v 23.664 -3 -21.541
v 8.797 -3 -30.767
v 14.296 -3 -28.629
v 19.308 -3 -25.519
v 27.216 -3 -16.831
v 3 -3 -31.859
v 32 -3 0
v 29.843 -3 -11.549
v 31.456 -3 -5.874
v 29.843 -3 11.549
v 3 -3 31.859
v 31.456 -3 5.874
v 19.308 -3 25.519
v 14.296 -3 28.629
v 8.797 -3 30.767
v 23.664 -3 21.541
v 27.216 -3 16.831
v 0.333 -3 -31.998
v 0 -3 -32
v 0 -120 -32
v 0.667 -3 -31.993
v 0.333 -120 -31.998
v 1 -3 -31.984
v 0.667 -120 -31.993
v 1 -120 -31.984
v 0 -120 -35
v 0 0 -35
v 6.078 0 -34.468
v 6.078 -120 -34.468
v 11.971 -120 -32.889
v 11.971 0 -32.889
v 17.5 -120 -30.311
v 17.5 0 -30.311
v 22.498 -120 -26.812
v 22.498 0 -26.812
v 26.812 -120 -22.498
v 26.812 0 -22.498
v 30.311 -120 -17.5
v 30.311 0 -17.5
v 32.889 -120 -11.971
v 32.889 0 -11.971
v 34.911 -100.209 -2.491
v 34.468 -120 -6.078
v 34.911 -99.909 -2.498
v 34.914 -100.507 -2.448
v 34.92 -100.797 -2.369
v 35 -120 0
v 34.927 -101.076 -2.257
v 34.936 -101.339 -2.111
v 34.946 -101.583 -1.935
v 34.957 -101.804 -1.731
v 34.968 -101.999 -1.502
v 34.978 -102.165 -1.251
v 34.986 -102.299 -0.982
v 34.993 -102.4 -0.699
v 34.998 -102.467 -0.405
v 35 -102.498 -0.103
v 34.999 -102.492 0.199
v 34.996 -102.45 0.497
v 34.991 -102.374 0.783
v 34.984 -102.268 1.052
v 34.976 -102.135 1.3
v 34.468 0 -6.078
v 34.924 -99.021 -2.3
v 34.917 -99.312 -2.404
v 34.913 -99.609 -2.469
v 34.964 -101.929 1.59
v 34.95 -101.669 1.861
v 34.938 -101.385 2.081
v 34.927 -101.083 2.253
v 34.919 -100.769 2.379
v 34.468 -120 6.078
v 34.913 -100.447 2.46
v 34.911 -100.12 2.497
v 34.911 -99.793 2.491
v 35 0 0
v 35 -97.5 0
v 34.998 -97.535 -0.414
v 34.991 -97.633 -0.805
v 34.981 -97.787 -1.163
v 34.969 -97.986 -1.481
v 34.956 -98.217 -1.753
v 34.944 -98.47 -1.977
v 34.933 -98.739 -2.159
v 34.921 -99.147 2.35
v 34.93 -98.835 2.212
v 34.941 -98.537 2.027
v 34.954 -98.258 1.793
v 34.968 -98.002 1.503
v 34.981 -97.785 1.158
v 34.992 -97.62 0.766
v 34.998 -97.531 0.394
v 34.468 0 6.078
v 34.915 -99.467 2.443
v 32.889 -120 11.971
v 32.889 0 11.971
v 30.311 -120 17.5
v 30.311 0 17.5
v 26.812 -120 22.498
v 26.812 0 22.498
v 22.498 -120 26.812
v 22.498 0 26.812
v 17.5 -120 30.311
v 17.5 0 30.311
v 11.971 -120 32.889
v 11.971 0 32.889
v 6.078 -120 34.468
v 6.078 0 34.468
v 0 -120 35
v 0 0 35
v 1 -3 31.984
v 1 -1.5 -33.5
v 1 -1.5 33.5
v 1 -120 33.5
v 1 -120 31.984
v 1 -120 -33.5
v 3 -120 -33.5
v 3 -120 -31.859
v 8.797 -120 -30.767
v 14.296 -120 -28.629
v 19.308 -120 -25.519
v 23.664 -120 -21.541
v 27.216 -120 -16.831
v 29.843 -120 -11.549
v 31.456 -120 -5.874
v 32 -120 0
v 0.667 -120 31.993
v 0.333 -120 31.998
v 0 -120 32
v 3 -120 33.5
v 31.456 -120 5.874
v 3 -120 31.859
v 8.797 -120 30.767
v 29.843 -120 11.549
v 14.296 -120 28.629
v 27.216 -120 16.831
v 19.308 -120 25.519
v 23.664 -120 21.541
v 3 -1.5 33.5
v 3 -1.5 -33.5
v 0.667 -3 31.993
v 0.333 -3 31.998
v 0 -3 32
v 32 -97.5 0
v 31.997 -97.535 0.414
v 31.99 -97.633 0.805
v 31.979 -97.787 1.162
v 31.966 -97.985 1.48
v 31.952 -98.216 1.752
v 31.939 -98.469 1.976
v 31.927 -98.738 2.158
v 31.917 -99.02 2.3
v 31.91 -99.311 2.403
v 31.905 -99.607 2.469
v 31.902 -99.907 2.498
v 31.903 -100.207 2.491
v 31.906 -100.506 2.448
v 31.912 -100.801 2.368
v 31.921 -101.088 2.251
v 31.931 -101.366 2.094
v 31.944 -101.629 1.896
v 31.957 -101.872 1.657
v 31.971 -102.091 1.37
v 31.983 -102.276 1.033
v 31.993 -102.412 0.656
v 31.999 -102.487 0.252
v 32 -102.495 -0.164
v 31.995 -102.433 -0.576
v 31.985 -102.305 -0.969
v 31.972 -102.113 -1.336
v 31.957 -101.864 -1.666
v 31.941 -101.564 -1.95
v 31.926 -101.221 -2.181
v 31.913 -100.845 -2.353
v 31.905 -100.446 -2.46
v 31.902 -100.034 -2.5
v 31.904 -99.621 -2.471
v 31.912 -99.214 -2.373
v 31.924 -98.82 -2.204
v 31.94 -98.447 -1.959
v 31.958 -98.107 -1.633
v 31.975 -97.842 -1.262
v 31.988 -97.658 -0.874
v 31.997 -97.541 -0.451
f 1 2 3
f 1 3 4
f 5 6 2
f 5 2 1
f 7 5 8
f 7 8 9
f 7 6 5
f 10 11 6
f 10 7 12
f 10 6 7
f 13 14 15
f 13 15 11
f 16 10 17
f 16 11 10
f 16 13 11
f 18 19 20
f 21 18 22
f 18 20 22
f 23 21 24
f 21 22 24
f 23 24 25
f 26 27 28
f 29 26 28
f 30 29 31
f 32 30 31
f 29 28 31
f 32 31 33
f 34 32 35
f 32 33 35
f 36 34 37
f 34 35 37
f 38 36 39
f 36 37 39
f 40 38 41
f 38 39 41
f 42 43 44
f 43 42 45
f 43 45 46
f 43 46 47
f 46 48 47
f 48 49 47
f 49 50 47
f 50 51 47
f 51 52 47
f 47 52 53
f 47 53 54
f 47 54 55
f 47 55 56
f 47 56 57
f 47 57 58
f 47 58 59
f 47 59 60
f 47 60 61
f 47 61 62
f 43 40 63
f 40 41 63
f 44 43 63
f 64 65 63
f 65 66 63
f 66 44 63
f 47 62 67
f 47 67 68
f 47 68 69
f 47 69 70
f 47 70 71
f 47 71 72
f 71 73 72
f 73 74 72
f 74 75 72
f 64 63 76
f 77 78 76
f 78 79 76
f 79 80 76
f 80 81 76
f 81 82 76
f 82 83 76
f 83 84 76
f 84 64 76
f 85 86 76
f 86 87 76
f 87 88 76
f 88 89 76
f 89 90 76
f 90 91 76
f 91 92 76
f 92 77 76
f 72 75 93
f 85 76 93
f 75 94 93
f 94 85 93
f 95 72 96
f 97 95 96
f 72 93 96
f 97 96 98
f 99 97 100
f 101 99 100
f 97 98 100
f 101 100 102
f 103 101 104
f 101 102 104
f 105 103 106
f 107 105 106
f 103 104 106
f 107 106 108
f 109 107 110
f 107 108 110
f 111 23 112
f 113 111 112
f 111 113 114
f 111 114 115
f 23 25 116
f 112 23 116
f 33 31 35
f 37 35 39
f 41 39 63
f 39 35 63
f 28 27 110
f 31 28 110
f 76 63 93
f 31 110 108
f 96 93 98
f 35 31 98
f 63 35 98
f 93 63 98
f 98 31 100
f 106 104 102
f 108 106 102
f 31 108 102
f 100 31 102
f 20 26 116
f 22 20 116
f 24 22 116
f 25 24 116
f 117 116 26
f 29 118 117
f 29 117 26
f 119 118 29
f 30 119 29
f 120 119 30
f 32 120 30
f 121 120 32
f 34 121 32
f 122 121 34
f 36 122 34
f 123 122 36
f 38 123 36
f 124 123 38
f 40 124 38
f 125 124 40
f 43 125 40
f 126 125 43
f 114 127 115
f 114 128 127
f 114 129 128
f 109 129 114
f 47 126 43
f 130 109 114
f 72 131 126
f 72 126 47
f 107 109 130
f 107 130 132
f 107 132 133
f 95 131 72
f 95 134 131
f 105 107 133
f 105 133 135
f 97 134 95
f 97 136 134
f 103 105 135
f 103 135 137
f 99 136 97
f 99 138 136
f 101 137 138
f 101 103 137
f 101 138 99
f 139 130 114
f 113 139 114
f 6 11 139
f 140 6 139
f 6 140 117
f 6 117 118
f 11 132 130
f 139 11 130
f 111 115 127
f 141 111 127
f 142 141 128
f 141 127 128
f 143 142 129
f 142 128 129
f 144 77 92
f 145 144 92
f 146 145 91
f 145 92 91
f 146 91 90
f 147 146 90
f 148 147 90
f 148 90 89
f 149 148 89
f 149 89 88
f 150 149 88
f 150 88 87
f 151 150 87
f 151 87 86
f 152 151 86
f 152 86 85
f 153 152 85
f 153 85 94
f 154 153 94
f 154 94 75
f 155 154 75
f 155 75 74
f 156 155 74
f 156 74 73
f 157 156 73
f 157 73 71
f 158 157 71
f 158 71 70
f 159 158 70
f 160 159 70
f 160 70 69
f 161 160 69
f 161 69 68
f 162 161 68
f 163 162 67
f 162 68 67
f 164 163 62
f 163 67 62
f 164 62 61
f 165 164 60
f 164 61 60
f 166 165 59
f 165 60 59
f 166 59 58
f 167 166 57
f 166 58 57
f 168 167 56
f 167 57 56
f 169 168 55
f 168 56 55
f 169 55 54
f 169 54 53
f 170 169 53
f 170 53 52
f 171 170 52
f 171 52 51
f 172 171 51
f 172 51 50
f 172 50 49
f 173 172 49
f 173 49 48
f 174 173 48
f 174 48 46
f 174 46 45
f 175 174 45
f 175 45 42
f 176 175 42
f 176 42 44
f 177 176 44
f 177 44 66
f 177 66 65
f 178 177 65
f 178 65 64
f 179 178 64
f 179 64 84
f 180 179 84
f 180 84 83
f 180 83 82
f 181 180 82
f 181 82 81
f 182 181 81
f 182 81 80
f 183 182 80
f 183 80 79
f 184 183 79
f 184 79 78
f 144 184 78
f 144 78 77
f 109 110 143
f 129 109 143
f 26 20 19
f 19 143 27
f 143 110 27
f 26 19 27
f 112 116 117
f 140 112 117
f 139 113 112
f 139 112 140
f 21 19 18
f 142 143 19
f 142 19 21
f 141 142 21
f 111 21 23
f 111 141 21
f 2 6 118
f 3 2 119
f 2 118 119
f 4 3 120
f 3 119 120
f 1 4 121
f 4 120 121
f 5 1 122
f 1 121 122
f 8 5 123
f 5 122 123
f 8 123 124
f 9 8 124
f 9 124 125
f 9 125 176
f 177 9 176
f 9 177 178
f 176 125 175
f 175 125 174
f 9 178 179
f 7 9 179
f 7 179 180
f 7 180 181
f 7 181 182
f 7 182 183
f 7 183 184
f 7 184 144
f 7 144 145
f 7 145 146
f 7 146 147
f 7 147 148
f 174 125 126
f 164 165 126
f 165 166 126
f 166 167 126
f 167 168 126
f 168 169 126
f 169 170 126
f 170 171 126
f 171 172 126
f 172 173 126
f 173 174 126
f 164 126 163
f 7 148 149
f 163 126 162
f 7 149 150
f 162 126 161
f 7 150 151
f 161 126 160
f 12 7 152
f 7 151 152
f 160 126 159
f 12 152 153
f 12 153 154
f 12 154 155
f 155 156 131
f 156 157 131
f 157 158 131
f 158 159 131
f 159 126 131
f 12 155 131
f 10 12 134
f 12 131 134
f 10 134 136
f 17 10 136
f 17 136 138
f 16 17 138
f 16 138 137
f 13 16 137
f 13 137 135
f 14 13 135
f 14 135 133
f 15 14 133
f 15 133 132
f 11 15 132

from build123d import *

# Parameters (mm, degrees)
F1_DEPTH = 120
F3_DEPTH = 117
F5_DEPTH = 118.5
F8_R     = 2.5
F9_DEPTH = 25


with BuildPart() as f1:
    # F0 (on Front) → F1 (new body)
    with BuildSketch(Plane.XZ):
        with BuildLine():
            ThreePointArc((0, -35), (35, 0), (0, 35))
            Line((0, 35), (0, -35))
        make_face()
    extrude(amount=F1_DEPTH)

    # F2 (on face) → F3 (cut)
    with BuildSketch(Plane.XZ.offset(120)):
        with BuildLine():
            ThreePointArc((0, -32), (32, 0), (0, 32))
            Line((0, 32), (0, -32))
        make_face()
    extrude(amount=-F3_DEPTH, mode=Mode.SUBTRACT)

    # F4 (on face) → F5 (cut)
    with BuildSketch(Plane.XZ.offset(120)):
        with BuildLine():
            ThreePointArc((3, 31.8590646441), (2.0009811174, 31.9373773903), (1, 31.9843711834))
            Line((1, 31.9843711834), (1, -31.9843711834))
            ThreePointArc((1, -31.9843711834), (2.0009811174, -31.9373773903), (3, -31.8590646441))
            Line((3, -31.8590646441), (3, 31.8590646441))
        make_face()
        with BuildLine():
            Line((3, 33.5), (1, 33.5))
            Line((1, 33.5), (1, 31.9843711834))
            ThreePointArc((1, 31.9843711834), (2.0009811174, 31.9373773903), (3, 31.8590646441))
            Line((3, 31.8590646441), (3, 33.5))
        make_face()
        with BuildLine():
            ThreePointArc((3, -31.8590646441), (2.0009811174, -31.9373773903), (1, -31.9843711834))
            Line((1, -31.9843711834), (1, -33.5))
            Line((1, -33.5), (3, -33.5))
            Line((3, -33.5), (3, -31.8590646441))
        make_face()
    extrude(amount=-F5_DEPTH, mode=Mode.SUBTRACT)

    # F8 (on line) → F9 (cut)
    with BuildSketch(Plane.YZ.offset(35)):
        with Locations((-100, 0)):
            Circle(F8_R)
    extrude(amount=-F9_DEPTH, mode=Mode.SUBTRACT)


solid = f1.part
